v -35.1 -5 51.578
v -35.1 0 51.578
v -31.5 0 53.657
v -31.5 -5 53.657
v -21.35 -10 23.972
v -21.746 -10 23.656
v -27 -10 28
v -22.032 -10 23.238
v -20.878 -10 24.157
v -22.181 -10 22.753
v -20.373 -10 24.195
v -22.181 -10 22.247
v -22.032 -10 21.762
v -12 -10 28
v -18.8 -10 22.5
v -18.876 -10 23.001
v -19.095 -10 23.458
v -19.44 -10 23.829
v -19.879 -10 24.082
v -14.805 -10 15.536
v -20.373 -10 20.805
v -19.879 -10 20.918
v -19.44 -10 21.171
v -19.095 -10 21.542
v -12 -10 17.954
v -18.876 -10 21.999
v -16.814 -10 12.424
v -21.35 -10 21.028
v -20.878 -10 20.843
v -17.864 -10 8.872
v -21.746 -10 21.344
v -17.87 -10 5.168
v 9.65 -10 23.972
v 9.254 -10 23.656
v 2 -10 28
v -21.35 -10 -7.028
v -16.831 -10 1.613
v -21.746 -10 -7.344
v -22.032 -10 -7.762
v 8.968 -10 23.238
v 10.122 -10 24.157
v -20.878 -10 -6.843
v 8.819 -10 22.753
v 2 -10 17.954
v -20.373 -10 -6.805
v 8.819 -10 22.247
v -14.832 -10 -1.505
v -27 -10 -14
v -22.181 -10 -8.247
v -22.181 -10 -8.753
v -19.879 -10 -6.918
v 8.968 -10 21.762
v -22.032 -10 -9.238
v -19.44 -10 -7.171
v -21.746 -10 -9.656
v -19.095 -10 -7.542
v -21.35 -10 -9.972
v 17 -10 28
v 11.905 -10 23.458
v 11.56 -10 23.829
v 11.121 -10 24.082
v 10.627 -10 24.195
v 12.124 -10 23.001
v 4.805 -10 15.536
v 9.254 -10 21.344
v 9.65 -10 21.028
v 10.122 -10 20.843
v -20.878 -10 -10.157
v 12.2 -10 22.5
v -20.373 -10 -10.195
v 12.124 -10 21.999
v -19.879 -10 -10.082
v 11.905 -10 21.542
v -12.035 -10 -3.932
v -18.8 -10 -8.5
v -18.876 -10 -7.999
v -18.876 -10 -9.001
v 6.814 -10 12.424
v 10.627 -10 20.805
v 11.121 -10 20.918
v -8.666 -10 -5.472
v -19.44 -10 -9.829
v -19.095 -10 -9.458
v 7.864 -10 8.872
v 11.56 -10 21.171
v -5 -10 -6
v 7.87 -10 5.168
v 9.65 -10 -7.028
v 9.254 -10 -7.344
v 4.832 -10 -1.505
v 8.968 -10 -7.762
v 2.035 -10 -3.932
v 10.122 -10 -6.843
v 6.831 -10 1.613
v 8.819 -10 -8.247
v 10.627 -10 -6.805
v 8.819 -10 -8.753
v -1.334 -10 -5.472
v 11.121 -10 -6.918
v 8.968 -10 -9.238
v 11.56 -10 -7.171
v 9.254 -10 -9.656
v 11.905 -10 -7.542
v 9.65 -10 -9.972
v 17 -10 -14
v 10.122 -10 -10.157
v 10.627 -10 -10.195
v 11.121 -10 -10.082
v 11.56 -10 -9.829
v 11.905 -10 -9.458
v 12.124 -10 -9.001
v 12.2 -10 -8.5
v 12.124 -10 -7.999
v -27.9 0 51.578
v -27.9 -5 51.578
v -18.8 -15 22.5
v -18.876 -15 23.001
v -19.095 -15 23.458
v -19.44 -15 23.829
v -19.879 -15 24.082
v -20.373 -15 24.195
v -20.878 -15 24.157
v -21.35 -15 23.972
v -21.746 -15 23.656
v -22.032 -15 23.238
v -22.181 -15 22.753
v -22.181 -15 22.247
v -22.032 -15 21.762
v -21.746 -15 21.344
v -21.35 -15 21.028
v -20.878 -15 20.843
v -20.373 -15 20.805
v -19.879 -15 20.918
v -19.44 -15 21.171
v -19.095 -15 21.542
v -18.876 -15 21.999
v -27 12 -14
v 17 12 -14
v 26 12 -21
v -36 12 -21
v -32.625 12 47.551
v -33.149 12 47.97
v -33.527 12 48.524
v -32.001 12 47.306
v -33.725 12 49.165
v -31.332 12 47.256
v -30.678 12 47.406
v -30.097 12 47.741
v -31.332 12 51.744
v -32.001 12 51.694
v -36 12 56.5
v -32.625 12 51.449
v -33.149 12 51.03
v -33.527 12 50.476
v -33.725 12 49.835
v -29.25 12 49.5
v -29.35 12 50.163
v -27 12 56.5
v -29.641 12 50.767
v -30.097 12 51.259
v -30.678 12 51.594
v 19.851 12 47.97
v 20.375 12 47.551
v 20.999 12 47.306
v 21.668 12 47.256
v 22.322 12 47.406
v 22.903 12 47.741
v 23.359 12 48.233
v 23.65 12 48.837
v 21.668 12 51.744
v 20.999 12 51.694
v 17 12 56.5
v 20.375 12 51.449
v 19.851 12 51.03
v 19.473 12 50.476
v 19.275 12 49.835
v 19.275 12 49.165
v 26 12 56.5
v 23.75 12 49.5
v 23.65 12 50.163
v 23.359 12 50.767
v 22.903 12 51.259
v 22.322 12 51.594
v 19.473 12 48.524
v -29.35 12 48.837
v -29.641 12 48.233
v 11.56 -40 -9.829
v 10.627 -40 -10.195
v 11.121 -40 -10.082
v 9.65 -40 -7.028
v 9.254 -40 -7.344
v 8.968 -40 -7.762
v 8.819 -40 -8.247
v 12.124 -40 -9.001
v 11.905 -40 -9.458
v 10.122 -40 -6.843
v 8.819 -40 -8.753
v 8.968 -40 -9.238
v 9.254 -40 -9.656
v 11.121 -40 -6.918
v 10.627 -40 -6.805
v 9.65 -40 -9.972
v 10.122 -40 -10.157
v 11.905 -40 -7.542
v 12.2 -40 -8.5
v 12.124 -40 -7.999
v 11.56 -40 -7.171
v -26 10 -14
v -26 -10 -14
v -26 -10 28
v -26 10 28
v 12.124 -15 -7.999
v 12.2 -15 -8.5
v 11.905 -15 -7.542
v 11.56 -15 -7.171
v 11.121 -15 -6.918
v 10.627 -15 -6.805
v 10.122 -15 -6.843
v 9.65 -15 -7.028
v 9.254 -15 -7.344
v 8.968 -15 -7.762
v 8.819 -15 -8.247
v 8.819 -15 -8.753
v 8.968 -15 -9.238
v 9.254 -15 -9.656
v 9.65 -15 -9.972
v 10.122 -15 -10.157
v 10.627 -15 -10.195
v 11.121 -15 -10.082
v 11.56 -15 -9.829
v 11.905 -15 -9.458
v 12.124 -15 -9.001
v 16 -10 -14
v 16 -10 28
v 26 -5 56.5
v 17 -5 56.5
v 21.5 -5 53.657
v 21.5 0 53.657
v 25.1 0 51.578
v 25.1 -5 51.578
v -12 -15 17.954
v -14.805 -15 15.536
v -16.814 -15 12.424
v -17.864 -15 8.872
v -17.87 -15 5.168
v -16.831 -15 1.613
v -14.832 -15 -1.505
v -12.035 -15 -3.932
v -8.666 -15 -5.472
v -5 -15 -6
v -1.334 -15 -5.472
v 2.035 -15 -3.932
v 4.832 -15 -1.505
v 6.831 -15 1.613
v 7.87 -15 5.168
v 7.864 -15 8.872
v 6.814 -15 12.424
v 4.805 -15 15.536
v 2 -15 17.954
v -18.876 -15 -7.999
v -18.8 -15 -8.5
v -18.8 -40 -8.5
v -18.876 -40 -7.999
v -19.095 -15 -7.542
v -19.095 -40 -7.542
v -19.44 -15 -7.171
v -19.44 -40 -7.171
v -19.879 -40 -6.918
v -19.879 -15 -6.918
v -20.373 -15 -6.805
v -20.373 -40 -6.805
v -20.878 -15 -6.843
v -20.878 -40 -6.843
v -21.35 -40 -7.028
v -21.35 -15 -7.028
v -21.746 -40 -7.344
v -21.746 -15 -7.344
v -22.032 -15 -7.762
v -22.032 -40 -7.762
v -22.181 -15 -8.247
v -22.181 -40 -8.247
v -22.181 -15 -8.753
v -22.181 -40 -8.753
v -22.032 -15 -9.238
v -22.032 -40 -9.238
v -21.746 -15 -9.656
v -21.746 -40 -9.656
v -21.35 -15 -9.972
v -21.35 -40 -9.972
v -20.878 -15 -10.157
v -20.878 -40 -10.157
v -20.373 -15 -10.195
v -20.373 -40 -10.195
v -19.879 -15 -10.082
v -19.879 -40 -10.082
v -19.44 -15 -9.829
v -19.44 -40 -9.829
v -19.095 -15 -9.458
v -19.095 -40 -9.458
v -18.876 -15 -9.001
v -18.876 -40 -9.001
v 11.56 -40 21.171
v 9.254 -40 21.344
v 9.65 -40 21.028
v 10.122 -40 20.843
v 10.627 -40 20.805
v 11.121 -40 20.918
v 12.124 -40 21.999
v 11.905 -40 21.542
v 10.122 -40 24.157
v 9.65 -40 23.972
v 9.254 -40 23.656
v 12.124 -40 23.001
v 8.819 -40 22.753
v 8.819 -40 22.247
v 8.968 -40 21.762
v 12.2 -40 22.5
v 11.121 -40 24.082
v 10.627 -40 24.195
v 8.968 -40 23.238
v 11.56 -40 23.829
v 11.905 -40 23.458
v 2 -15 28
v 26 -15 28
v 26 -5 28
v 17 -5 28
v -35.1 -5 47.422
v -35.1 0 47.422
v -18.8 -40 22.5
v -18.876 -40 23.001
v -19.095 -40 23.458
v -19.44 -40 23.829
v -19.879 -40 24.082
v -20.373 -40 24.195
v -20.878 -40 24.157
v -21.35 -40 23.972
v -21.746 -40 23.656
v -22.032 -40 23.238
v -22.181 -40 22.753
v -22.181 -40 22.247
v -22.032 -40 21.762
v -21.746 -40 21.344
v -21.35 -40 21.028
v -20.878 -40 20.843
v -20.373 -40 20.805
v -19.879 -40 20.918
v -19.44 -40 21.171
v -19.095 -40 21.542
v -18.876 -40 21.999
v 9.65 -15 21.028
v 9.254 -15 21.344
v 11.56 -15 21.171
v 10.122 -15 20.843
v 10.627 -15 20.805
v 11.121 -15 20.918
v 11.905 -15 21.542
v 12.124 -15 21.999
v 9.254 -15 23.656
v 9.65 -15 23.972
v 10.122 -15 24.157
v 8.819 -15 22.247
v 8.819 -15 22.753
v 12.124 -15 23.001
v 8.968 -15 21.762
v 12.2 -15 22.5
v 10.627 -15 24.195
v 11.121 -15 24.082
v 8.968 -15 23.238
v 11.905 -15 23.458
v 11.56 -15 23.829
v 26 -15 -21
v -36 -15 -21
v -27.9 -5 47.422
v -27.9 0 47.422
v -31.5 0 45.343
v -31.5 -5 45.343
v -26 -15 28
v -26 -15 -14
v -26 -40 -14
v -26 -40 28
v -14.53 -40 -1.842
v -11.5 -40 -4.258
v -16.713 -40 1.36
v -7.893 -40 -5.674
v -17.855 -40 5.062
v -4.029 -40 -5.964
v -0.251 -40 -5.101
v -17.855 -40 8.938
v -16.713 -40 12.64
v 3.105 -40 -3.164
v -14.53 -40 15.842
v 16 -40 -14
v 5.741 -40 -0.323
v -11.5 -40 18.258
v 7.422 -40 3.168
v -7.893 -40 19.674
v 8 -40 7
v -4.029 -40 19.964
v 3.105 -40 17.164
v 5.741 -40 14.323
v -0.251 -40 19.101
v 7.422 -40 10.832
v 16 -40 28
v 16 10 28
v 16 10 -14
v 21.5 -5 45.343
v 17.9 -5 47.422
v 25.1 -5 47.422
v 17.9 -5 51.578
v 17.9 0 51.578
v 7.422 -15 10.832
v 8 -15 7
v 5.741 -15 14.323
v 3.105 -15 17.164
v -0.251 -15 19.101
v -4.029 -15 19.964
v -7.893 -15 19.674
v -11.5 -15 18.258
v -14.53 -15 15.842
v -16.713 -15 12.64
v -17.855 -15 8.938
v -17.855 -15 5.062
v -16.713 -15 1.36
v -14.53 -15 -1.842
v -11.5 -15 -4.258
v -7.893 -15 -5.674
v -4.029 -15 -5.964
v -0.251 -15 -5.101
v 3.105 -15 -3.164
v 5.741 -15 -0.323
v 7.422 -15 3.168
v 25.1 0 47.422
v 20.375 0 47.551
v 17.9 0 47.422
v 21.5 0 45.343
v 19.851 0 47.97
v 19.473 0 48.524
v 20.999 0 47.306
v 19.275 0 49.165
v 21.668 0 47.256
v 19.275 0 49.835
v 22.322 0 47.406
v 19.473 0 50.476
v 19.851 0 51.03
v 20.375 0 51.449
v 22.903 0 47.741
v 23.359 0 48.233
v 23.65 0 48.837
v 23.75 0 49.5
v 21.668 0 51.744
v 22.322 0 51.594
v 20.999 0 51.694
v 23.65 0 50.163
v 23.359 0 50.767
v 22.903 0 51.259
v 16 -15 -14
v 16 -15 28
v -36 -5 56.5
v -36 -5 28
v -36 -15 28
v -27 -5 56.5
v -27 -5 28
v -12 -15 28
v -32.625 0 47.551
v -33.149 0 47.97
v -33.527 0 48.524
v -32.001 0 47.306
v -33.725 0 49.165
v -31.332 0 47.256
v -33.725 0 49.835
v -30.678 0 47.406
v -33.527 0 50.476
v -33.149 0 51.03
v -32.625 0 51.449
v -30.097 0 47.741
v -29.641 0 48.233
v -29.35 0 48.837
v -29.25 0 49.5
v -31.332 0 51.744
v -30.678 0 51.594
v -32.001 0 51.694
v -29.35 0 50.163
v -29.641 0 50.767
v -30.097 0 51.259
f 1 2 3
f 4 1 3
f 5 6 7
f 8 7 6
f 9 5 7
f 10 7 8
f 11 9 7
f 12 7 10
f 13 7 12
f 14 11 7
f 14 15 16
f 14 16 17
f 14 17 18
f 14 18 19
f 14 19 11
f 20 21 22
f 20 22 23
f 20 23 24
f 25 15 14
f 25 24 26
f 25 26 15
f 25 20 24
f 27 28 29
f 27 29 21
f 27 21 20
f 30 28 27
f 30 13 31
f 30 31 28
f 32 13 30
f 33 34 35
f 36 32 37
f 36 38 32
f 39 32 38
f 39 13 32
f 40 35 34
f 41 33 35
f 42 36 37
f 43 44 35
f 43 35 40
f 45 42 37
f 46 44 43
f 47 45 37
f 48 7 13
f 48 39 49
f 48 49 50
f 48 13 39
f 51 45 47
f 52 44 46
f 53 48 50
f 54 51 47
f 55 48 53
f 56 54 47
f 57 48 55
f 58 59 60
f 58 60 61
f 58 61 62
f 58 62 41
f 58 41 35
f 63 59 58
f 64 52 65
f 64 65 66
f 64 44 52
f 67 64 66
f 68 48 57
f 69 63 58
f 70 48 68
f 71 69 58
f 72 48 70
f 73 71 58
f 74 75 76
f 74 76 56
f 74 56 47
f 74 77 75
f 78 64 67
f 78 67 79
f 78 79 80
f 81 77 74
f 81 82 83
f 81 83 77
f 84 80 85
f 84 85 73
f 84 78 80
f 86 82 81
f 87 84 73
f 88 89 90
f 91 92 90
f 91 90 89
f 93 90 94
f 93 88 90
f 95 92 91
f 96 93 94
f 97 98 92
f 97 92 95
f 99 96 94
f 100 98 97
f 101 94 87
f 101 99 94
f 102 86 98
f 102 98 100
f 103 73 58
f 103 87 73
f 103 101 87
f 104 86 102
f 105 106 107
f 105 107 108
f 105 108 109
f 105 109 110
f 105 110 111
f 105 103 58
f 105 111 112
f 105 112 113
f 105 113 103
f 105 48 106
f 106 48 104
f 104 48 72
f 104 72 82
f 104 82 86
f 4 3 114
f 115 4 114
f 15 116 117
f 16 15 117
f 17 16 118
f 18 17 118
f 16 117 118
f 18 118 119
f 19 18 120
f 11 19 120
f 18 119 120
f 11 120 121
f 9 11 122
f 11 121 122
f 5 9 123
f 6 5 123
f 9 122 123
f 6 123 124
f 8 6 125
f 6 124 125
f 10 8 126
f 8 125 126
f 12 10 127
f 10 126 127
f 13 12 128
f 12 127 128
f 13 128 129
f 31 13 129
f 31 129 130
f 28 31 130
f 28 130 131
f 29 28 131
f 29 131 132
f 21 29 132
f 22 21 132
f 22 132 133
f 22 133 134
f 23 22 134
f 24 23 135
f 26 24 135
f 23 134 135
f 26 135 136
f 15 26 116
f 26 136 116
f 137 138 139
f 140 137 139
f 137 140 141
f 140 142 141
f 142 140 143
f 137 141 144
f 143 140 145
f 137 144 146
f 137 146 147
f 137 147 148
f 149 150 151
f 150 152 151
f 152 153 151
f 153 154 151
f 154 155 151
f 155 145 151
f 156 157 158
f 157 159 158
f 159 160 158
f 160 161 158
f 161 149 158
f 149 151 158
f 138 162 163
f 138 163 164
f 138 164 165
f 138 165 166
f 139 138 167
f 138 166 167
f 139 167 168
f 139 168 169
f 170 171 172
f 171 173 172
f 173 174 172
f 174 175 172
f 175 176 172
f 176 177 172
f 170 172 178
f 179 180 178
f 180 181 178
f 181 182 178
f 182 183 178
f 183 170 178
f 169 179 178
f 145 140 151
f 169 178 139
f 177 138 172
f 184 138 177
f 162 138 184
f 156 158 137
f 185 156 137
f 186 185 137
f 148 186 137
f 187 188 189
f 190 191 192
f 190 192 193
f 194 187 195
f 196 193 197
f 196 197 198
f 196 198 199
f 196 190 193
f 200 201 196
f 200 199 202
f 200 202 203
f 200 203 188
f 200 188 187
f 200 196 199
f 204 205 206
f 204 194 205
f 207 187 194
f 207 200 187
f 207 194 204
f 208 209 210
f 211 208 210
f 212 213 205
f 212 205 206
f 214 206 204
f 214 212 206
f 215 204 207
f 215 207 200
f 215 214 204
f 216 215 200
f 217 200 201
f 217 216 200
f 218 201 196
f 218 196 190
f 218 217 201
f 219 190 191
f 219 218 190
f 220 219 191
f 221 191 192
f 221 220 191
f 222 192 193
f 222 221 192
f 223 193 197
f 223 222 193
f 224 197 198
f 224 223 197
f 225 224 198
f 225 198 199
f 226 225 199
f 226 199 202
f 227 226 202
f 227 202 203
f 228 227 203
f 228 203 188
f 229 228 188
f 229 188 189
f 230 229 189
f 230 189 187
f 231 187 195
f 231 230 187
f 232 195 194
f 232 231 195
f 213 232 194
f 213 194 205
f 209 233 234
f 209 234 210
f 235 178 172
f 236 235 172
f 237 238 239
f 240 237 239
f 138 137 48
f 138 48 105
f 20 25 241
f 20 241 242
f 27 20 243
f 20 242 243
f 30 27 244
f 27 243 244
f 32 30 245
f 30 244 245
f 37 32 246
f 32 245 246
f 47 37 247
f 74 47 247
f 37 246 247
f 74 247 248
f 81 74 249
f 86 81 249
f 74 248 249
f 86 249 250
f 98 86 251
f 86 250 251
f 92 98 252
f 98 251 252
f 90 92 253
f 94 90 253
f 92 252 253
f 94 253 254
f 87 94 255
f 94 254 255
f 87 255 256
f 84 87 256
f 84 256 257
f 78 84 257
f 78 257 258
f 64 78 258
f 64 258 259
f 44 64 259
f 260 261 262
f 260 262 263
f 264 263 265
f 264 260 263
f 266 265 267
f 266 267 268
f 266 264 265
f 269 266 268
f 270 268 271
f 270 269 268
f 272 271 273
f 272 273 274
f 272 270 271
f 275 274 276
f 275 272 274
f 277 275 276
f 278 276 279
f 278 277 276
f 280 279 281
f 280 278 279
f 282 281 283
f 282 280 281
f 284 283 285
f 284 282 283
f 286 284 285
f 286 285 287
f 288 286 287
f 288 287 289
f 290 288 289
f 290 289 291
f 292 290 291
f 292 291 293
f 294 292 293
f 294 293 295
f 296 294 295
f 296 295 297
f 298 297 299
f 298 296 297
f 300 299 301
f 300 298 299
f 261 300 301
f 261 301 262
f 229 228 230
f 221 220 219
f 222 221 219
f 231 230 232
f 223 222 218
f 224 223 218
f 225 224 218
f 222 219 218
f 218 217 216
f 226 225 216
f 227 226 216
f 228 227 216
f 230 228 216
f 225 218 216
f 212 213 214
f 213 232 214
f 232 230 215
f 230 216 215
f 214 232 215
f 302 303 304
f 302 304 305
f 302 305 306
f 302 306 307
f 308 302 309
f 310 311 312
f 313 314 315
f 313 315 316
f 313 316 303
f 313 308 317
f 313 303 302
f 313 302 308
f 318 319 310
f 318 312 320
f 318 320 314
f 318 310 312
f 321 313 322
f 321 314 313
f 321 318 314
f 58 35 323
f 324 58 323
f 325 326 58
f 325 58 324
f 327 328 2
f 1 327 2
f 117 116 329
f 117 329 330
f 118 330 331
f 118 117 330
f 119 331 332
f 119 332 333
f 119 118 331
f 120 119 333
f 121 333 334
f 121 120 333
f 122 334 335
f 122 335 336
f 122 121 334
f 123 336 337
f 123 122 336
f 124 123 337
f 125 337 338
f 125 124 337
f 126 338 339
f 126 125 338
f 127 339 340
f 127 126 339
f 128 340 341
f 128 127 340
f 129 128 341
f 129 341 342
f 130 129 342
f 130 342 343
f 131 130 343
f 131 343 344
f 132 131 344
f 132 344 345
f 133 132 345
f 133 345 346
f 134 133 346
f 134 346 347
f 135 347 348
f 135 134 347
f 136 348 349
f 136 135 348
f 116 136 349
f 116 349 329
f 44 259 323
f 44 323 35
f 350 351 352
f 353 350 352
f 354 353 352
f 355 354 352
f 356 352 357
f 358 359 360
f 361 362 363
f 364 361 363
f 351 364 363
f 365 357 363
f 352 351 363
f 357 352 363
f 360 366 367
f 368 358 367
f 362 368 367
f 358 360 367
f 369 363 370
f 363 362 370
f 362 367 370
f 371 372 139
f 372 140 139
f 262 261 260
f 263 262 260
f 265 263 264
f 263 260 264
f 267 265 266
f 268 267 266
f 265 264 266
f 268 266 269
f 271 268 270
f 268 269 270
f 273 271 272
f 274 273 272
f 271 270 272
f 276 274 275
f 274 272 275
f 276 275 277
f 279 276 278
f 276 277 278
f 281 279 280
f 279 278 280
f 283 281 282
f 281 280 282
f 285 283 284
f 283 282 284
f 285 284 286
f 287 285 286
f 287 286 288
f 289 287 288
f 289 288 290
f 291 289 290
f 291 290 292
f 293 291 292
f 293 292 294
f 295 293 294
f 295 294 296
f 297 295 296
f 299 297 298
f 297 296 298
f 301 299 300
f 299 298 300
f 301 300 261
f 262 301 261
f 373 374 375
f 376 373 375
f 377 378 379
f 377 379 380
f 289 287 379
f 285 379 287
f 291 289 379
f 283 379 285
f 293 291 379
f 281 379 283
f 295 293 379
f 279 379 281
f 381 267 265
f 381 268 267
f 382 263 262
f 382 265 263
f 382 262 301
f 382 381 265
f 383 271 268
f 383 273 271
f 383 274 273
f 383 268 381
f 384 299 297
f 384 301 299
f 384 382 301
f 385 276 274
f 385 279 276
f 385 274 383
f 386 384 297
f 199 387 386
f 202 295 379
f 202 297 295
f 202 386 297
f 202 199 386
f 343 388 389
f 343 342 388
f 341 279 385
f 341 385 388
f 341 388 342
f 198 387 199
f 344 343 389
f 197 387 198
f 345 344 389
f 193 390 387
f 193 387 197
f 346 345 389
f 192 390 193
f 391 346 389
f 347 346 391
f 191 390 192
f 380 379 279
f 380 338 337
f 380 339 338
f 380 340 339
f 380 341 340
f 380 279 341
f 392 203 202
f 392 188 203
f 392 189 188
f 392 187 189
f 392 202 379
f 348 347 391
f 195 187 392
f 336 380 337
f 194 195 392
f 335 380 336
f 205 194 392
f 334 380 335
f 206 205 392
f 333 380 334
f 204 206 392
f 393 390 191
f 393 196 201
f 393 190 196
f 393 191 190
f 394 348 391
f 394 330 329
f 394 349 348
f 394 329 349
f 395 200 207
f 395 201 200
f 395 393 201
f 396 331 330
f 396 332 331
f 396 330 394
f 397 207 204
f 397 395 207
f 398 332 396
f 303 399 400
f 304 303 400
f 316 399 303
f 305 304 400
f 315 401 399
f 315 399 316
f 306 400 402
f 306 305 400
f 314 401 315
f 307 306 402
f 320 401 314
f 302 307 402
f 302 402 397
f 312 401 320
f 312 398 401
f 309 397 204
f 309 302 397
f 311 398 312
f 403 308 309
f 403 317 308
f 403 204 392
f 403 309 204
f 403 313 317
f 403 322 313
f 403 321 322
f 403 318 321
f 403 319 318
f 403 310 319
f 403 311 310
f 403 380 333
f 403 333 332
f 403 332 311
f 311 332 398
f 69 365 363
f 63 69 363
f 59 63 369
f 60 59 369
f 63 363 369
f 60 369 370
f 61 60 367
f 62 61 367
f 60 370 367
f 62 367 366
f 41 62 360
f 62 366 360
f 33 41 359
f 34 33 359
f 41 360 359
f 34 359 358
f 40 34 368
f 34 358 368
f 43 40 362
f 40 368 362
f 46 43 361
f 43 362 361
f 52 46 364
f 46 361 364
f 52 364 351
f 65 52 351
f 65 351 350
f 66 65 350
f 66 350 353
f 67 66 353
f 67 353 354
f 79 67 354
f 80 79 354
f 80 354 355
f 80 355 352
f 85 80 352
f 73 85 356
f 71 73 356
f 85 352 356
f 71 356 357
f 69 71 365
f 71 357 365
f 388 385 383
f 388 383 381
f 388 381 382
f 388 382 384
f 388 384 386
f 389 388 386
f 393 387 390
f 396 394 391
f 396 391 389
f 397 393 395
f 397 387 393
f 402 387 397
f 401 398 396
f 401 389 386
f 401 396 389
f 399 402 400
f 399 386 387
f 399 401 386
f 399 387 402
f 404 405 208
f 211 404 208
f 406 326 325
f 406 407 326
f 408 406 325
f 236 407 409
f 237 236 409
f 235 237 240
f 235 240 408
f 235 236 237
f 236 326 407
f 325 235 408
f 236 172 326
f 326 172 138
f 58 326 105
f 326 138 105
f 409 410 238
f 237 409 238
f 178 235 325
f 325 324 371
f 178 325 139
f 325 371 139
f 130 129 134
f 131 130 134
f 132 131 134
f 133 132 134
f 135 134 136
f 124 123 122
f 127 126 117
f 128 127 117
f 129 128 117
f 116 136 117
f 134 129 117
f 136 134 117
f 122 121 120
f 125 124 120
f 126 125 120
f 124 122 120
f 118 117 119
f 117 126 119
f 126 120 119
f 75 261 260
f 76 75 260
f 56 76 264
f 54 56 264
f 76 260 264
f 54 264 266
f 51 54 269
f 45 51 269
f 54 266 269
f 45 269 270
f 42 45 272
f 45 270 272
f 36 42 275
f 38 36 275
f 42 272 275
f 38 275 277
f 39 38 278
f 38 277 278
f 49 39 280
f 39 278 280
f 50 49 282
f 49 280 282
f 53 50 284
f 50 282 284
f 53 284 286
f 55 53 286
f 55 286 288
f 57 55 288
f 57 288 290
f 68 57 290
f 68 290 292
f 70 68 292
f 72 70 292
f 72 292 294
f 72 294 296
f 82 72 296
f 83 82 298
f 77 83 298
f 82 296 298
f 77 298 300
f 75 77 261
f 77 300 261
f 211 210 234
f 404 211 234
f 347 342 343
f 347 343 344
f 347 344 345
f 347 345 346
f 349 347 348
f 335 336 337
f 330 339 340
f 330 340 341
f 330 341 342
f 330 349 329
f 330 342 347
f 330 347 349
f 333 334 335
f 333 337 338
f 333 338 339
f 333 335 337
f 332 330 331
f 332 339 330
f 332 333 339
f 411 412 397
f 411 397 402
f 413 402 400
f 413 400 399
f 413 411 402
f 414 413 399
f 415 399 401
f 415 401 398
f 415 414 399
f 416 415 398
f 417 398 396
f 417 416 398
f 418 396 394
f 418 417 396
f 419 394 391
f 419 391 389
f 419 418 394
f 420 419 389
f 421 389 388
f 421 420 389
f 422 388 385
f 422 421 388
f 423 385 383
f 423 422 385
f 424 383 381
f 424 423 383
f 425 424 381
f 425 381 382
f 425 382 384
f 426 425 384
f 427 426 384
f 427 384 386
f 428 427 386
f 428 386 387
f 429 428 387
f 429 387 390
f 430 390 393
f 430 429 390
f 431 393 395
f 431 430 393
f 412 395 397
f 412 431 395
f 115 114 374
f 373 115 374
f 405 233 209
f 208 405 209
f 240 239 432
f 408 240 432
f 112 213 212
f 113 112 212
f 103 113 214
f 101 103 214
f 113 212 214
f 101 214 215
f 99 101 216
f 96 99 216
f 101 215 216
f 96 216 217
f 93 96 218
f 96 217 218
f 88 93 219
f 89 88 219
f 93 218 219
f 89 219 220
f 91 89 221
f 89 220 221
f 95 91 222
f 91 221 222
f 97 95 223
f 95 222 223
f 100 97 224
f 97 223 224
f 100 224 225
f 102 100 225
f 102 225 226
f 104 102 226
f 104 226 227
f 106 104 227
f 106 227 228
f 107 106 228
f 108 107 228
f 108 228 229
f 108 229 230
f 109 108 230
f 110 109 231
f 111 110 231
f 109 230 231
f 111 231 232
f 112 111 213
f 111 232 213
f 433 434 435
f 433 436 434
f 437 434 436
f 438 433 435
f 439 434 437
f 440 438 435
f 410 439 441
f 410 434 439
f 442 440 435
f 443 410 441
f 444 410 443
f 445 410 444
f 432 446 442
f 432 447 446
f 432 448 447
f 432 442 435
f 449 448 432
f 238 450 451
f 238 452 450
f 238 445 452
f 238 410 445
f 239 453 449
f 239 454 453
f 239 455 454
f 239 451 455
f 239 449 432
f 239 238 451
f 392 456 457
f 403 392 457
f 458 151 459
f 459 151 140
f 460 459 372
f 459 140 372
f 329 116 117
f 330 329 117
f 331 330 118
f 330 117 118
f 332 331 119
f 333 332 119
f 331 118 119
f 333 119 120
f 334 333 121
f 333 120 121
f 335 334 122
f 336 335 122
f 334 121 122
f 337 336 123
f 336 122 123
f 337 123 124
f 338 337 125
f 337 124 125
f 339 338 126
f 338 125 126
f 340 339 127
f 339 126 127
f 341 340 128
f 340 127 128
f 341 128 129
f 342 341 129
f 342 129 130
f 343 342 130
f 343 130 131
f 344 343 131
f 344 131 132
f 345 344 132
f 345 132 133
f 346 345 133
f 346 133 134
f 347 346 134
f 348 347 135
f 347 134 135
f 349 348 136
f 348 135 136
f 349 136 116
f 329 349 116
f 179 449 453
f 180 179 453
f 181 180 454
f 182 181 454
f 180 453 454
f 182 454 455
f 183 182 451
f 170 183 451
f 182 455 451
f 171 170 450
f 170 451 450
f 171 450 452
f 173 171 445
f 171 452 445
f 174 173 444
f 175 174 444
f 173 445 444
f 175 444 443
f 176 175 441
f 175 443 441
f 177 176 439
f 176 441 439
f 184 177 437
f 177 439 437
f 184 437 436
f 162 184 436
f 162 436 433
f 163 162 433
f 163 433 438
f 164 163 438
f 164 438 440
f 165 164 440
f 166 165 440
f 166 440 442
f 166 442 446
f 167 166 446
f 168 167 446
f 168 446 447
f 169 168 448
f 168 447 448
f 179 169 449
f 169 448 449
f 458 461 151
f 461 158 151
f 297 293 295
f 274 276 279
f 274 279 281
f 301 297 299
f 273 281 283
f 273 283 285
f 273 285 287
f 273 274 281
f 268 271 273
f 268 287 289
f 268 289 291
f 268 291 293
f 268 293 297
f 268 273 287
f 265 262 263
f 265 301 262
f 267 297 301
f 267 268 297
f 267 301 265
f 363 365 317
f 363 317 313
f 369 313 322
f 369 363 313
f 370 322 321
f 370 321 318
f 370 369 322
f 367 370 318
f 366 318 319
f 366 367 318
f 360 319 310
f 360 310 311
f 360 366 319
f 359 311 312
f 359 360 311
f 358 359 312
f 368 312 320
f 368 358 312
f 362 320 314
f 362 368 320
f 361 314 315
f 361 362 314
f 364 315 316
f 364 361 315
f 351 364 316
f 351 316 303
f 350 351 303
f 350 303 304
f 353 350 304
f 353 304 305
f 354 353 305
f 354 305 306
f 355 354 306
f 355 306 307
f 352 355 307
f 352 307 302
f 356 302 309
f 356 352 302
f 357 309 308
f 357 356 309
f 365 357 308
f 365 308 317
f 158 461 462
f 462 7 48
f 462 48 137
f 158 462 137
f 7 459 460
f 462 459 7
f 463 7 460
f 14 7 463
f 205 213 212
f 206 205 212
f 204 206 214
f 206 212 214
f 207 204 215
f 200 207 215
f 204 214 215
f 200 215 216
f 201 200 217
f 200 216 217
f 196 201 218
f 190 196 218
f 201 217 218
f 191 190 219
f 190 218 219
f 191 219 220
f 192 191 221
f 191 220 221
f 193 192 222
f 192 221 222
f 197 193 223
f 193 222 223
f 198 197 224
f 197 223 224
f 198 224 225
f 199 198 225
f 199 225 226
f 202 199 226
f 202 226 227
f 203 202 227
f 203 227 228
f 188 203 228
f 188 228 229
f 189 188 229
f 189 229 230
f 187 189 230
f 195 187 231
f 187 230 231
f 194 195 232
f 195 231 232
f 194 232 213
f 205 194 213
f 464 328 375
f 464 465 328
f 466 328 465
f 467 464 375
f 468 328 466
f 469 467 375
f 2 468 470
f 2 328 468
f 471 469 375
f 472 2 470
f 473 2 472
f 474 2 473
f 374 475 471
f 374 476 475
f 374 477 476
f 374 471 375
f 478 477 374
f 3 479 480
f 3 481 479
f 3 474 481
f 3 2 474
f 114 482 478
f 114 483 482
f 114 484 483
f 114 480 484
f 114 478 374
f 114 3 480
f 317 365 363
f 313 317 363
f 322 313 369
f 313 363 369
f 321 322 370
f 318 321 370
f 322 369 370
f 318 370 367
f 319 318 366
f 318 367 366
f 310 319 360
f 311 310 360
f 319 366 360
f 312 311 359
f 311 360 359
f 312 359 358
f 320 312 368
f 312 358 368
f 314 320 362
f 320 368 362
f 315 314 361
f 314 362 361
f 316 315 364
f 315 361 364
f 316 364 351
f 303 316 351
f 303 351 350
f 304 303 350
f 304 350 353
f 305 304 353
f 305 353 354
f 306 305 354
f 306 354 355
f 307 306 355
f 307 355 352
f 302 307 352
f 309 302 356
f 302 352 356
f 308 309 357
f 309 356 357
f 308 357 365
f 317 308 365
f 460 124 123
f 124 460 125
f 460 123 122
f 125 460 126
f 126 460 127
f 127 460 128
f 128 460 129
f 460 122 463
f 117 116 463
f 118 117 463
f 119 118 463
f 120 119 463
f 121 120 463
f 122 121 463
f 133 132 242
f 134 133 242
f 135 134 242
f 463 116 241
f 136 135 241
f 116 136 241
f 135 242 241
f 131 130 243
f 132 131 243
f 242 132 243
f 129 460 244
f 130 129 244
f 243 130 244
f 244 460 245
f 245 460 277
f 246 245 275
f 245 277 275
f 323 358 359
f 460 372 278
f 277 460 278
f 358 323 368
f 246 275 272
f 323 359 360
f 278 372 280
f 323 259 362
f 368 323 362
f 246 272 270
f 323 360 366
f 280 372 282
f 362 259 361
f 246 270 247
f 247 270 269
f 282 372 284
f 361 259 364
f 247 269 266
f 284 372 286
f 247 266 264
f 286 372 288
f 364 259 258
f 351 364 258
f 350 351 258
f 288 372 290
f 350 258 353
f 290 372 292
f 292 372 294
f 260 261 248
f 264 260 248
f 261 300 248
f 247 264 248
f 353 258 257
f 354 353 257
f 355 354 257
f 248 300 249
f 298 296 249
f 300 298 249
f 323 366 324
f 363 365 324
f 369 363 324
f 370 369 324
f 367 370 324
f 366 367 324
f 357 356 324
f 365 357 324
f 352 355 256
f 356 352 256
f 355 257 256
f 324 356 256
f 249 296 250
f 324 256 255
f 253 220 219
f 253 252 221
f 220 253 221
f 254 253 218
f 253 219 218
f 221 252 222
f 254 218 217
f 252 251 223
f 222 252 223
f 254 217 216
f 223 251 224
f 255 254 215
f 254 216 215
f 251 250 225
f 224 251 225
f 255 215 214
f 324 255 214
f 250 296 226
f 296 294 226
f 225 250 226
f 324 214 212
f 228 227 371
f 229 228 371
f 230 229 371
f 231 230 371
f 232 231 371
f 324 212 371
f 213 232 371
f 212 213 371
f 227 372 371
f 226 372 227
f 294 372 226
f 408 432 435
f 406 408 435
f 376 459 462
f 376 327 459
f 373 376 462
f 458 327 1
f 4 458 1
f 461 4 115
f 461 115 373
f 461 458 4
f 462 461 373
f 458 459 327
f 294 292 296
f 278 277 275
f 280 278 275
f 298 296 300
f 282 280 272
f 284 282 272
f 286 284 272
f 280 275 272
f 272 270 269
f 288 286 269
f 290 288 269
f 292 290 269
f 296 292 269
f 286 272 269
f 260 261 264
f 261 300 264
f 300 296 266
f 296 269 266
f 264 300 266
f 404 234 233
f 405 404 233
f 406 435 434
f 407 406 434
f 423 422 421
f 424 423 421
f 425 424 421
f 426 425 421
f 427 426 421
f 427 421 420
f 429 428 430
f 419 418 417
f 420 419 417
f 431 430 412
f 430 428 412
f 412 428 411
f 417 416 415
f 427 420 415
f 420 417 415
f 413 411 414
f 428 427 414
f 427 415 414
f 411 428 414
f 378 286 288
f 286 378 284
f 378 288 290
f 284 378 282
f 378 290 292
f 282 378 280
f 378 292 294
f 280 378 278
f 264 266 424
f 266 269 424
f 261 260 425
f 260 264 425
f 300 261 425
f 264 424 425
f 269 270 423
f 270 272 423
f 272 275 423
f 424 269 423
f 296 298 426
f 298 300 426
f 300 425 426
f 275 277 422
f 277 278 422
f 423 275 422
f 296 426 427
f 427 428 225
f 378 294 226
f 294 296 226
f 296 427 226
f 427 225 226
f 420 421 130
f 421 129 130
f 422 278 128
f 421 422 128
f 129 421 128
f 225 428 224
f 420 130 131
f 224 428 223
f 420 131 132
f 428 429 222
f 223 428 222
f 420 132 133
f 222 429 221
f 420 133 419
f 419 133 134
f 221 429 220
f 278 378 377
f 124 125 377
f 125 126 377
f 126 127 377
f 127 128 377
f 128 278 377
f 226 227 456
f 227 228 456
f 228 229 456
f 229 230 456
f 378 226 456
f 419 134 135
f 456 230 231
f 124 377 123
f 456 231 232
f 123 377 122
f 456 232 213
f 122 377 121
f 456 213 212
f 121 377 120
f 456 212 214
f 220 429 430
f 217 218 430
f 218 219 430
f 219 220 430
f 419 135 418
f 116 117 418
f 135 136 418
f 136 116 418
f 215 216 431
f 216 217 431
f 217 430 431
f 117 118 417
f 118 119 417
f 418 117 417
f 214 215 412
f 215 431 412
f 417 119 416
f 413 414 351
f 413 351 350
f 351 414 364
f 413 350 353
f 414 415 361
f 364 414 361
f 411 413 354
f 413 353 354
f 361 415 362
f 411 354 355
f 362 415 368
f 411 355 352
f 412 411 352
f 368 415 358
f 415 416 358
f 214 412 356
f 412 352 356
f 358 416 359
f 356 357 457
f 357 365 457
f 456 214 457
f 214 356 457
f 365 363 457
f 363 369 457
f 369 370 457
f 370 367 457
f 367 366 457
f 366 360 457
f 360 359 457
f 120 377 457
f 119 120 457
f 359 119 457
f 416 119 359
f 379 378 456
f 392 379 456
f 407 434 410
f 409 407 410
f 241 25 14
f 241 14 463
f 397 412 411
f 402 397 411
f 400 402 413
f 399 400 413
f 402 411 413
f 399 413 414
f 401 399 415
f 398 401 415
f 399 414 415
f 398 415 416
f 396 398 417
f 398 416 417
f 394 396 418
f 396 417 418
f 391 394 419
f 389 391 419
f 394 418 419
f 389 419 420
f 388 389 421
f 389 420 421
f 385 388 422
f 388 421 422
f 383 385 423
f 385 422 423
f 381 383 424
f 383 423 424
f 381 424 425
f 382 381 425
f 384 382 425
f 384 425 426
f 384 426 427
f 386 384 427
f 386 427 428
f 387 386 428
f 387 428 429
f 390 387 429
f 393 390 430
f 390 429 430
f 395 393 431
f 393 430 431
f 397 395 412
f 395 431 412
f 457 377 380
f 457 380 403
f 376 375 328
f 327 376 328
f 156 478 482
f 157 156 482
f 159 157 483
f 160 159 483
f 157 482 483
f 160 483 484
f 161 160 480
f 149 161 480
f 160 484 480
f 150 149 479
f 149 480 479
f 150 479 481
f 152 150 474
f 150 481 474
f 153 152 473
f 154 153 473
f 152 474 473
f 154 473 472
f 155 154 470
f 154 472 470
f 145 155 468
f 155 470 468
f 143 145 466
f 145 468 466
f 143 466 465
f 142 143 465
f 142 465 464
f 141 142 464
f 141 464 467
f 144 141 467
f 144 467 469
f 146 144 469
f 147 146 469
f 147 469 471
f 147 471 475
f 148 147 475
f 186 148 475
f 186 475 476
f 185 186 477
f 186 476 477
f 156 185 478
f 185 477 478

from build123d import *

# Parameters (mm, degrees)
F1_R      = 2.25
F2_DEPTH  = 12
F4_DEPTH  = 5
F5_W      = 44
F5_H      = 5
F6_DEPTH  = 7
F7_DEPTH  = 42
F8_R      = 1.7
F8_R_2    = 13
F9_DEPTH  = 5
F11_REACH = 63.8670687473
F12_R     = 1.7
F13_DEPTH = 20
F14_W     = 42
F14_H     = 42
F14_R     = 1.7
F14_R_2   = 13
F15_DEPTH = 25


with BuildPart() as f2:
    # F1 (on Front) → F2 (new body)
    with BuildSketch(Plane.XZ):
        Polygon((-27, 56.5), (-36, 56.5), (-36, -21), (26, -21), (26, 56.5), (17, 56.5), (17, -14), (-27, -14), align=None)
        with Locations((-31.5, 49.5)):
            Circle(F1_R, mode=Mode.SUBTRACT)
        with Locations((21.5, 49.5)):
            Circle(F1_R, mode=Mode.SUBTRACT)
    extrude(amount=-F2_DEPTH)

    # F3 (on face) → F4 (join)
    with BuildSketch(Plane.XZ):
        Polygon((-27, -14), (-27, 56.5), (-36, 56.5), (-36, -21), (26, -21), (26, 56.5), (17, 56.5), (17, -14), align=None)
        Polygon((-31.5, 53.6569219382), (-27.9, 51.5784609691), (-27.9, 47.4215390309), (-31.5, 45.3430780618), (-35.1, 47.4215390309), (-35.1, 51.5784609691), align=None, mode=Mode.SUBTRACT)
        Polygon((21.5, 53.6569219382), (25.1, 51.5784609691), (25.1, 47.4215390309), (21.5, 45.3430780618), (17.9, 47.4215390309), (17.9, 51.5784609691), align=None, mode=Mode.SUBTRACT)
    extrude(amount=F4_DEPTH)

    # F5 (on face) → F6 (join, through all)
    with BuildSketch(Plane.XY.offset(-14)):
        with Locations((-5, -7.5)):
            Rectangle(F5_W, F5_H)
        with Locations((-5, -12.5)):
            Rectangle(F5_W, F5_H)
        Polygon((-27, -10), (-27, -5), (-36, -5), (-36, -15), (-27, -15), align=None)
        Polygon((26, -5), (17, -5), (17, -10), (17, -15), (26, -15), align=None)
    extrude(amount=-F6_DEPTH)

    # F5 (on face) → F7 (join)
    with BuildSketch(Plane.XY.offset(-14)):
        with Locations((-5, -12.5)):
            Rectangle(F5_W, F5_H)
        Polygon((-27, -10), (-27, -5), (-36, -5), (-36, -15), (-27, -15), align=None)
        Polygon((26, -5), (17, -5), (17, -10), (17, -15), (26, -15), align=None)
    extrude(amount=F7_DEPTH)

    # F8 (on face) → F9 (cut, through all)
    with BuildSketch(Plane.XZ.offset(15)):
        with Locations((-20.5, 22.5)):
            Circle(F8_R)
        with Locations((-5, 7)):
            Circle(F8_R_2)
        with Locations((-20.5, -8.5)):
            Circle(F8_R)
        with Locations((10.5, -8.5)):
            Circle(F8_R)
        with Locations((10.5, 22.5)):
            Circle(F8_R)
    extrude(amount=-F9_DEPTH, mode=Mode.SUBTRACT)

    f11_end = f2.faces().sort_by_distance((-18, -12.5, 7))[0]
    # F10 (on face) → F11 (cut, up to a face of the model that its end follows)
    with BuildSketch(Plane.XY.offset(28)):
        Polygon((2, -10), (-5, -10), (-12, -10), (-12, -15), (2, -15), align=None)
    f11_long = extrude(amount=-F11_REACH, mode=Mode.PRIVATE)
    add(split(f11_long, bisect_by=f11_end, keep=Keep.ALL, mode=Mode.PRIVATE).solids().sort_by_distance((-5, -12.5, 28))[0], mode=Mode.SUBTRACT)


with BuildPart() as f13:
    # F12 (on face) → F13 (new body)
    with BuildSketch(Plane(origin=(0, -10, 0), x_dir=(-1, 0, 0), z_dir=(0, 1, 0))):
        with BuildLine():
            Line((-16, -14), (26, -14))
            Line((26, -14), (26, 28))
            Line((26, 28), (12, 28))
            Line((12, 28), (12, 17.9544511501))
            ThreePointArc((12, 17.9544511501), (5, -6), (-2, 17.9544511501))
            Line((-2, 17.9544511501), (-2, 28))
            Line((-2, 28), (-16, 28))
            Line((-16, 28), (-16, -14))
        make_face()
        with Locations((-10.5, -8.5)):
            Circle(F12_R, mode=Mode.SUBTRACT)
        with Locations((20.5, -8.5)):
            Circle(F12_R, mode=Mode.SUBTRACT)
        with Locations((-10.5, 22.5)):
            Circle(F12_R, mode=Mode.SUBTRACT)
        with Locations((20.5, 22.5)):
            Circle(F12_R, mode=Mode.SUBTRACT)
        with BuildLine():
            Line((12, 17.9544511501), (12, 28))
            Line((12, 28), (-2, 28))
            Line((-2, 28), (-2, 17.9544511501))
            ThreePointArc((-2, 17.9544511501), (5, -6), (12, 17.9544511501))
        make_face()
        with Locations((20.5, 22.5)):
            Circle(F12_R)
        with Locations((-10.5, 22.5)):
            Circle(F12_R)
        with Locations((-10.5, -8.5)):
            Circle(F12_R)
        with Locations((20.5, -8.5)):
            Circle(F12_R)
    extrude(amount=F13_DEPTH)


with BuildPart() as f15:
    # F14 (on face) → F15 (new body)
    with BuildSketch(Plane.XZ.offset(15)):
        with Locations((-5, 7)):
            Rectangle(F14_W, F14_H)
        with Locations((-20.5, -8.5)):
            Circle(F14_R, mode=Mode.SUBTRACT)
        with Locations((10.5, -8.5)):
            Circle(F14_R, mode=Mode.SUBTRACT)
        with Locations((-20.5, 22.5)):
            Circle(F14_R, mode=Mode.SUBTRACT)
        with Locations((-5, 7)):
            Circle(F14_R_2, mode=Mode.SUBTRACT)
        with Locations((10.5, 22.5)):
            Circle(F14_R, mode=Mode.SUBTRACT)
    extrude(amount=F15_DEPTH)


with BuildPart() as f15b:
    # F8 (on face) → F15, piece 2 (new body)
    with BuildSketch(Plane.XZ.offset(15)):
        with Locations((-20.5, 22.5)):
            Circle(F8_R)
    extrude(amount=F15_DEPTH)


with BuildPart() as f15c:
    # F8 (on face) → F15, piece 3 (new body)
    with BuildSketch(Plane.XZ.offset(15)):
        with Locations((-5, 7)):
            Circle(F8_R_2)
    extrude(amount=F15_DEPTH)


with BuildPart() as f15d:
    # F8 (on face) → F15, piece 4 (new body)
    with BuildSketch(Plane.XZ.offset(15)):
        with Locations((-20.5, -8.5)):
            Circle(F8_R)
    extrude(amount=F15_DEPTH)


with BuildPart() as f15e:
    # F8 (on face) → F15, piece 5 (new body)
    with BuildSketch(Plane.XZ.offset(15)):
        with Locations((10.5, 22.5)):
            Circle(F8_R)
    extrude(amount=F15_DEPTH)


with BuildPart() as f15f:
    # F8 (on face) → F15, piece 6 (new body)
    with BuildSketch(Plane.XZ.offset(15)):
        with Locations((10.5, -8.5)):
            Circle(F8_R)
    extrude(amount=F15_DEPTH)


solid = Compound([f2.part, f13.part, f15.part, f15b.part, f15c.part, f15d.part, f15e.part, f15f.part])
